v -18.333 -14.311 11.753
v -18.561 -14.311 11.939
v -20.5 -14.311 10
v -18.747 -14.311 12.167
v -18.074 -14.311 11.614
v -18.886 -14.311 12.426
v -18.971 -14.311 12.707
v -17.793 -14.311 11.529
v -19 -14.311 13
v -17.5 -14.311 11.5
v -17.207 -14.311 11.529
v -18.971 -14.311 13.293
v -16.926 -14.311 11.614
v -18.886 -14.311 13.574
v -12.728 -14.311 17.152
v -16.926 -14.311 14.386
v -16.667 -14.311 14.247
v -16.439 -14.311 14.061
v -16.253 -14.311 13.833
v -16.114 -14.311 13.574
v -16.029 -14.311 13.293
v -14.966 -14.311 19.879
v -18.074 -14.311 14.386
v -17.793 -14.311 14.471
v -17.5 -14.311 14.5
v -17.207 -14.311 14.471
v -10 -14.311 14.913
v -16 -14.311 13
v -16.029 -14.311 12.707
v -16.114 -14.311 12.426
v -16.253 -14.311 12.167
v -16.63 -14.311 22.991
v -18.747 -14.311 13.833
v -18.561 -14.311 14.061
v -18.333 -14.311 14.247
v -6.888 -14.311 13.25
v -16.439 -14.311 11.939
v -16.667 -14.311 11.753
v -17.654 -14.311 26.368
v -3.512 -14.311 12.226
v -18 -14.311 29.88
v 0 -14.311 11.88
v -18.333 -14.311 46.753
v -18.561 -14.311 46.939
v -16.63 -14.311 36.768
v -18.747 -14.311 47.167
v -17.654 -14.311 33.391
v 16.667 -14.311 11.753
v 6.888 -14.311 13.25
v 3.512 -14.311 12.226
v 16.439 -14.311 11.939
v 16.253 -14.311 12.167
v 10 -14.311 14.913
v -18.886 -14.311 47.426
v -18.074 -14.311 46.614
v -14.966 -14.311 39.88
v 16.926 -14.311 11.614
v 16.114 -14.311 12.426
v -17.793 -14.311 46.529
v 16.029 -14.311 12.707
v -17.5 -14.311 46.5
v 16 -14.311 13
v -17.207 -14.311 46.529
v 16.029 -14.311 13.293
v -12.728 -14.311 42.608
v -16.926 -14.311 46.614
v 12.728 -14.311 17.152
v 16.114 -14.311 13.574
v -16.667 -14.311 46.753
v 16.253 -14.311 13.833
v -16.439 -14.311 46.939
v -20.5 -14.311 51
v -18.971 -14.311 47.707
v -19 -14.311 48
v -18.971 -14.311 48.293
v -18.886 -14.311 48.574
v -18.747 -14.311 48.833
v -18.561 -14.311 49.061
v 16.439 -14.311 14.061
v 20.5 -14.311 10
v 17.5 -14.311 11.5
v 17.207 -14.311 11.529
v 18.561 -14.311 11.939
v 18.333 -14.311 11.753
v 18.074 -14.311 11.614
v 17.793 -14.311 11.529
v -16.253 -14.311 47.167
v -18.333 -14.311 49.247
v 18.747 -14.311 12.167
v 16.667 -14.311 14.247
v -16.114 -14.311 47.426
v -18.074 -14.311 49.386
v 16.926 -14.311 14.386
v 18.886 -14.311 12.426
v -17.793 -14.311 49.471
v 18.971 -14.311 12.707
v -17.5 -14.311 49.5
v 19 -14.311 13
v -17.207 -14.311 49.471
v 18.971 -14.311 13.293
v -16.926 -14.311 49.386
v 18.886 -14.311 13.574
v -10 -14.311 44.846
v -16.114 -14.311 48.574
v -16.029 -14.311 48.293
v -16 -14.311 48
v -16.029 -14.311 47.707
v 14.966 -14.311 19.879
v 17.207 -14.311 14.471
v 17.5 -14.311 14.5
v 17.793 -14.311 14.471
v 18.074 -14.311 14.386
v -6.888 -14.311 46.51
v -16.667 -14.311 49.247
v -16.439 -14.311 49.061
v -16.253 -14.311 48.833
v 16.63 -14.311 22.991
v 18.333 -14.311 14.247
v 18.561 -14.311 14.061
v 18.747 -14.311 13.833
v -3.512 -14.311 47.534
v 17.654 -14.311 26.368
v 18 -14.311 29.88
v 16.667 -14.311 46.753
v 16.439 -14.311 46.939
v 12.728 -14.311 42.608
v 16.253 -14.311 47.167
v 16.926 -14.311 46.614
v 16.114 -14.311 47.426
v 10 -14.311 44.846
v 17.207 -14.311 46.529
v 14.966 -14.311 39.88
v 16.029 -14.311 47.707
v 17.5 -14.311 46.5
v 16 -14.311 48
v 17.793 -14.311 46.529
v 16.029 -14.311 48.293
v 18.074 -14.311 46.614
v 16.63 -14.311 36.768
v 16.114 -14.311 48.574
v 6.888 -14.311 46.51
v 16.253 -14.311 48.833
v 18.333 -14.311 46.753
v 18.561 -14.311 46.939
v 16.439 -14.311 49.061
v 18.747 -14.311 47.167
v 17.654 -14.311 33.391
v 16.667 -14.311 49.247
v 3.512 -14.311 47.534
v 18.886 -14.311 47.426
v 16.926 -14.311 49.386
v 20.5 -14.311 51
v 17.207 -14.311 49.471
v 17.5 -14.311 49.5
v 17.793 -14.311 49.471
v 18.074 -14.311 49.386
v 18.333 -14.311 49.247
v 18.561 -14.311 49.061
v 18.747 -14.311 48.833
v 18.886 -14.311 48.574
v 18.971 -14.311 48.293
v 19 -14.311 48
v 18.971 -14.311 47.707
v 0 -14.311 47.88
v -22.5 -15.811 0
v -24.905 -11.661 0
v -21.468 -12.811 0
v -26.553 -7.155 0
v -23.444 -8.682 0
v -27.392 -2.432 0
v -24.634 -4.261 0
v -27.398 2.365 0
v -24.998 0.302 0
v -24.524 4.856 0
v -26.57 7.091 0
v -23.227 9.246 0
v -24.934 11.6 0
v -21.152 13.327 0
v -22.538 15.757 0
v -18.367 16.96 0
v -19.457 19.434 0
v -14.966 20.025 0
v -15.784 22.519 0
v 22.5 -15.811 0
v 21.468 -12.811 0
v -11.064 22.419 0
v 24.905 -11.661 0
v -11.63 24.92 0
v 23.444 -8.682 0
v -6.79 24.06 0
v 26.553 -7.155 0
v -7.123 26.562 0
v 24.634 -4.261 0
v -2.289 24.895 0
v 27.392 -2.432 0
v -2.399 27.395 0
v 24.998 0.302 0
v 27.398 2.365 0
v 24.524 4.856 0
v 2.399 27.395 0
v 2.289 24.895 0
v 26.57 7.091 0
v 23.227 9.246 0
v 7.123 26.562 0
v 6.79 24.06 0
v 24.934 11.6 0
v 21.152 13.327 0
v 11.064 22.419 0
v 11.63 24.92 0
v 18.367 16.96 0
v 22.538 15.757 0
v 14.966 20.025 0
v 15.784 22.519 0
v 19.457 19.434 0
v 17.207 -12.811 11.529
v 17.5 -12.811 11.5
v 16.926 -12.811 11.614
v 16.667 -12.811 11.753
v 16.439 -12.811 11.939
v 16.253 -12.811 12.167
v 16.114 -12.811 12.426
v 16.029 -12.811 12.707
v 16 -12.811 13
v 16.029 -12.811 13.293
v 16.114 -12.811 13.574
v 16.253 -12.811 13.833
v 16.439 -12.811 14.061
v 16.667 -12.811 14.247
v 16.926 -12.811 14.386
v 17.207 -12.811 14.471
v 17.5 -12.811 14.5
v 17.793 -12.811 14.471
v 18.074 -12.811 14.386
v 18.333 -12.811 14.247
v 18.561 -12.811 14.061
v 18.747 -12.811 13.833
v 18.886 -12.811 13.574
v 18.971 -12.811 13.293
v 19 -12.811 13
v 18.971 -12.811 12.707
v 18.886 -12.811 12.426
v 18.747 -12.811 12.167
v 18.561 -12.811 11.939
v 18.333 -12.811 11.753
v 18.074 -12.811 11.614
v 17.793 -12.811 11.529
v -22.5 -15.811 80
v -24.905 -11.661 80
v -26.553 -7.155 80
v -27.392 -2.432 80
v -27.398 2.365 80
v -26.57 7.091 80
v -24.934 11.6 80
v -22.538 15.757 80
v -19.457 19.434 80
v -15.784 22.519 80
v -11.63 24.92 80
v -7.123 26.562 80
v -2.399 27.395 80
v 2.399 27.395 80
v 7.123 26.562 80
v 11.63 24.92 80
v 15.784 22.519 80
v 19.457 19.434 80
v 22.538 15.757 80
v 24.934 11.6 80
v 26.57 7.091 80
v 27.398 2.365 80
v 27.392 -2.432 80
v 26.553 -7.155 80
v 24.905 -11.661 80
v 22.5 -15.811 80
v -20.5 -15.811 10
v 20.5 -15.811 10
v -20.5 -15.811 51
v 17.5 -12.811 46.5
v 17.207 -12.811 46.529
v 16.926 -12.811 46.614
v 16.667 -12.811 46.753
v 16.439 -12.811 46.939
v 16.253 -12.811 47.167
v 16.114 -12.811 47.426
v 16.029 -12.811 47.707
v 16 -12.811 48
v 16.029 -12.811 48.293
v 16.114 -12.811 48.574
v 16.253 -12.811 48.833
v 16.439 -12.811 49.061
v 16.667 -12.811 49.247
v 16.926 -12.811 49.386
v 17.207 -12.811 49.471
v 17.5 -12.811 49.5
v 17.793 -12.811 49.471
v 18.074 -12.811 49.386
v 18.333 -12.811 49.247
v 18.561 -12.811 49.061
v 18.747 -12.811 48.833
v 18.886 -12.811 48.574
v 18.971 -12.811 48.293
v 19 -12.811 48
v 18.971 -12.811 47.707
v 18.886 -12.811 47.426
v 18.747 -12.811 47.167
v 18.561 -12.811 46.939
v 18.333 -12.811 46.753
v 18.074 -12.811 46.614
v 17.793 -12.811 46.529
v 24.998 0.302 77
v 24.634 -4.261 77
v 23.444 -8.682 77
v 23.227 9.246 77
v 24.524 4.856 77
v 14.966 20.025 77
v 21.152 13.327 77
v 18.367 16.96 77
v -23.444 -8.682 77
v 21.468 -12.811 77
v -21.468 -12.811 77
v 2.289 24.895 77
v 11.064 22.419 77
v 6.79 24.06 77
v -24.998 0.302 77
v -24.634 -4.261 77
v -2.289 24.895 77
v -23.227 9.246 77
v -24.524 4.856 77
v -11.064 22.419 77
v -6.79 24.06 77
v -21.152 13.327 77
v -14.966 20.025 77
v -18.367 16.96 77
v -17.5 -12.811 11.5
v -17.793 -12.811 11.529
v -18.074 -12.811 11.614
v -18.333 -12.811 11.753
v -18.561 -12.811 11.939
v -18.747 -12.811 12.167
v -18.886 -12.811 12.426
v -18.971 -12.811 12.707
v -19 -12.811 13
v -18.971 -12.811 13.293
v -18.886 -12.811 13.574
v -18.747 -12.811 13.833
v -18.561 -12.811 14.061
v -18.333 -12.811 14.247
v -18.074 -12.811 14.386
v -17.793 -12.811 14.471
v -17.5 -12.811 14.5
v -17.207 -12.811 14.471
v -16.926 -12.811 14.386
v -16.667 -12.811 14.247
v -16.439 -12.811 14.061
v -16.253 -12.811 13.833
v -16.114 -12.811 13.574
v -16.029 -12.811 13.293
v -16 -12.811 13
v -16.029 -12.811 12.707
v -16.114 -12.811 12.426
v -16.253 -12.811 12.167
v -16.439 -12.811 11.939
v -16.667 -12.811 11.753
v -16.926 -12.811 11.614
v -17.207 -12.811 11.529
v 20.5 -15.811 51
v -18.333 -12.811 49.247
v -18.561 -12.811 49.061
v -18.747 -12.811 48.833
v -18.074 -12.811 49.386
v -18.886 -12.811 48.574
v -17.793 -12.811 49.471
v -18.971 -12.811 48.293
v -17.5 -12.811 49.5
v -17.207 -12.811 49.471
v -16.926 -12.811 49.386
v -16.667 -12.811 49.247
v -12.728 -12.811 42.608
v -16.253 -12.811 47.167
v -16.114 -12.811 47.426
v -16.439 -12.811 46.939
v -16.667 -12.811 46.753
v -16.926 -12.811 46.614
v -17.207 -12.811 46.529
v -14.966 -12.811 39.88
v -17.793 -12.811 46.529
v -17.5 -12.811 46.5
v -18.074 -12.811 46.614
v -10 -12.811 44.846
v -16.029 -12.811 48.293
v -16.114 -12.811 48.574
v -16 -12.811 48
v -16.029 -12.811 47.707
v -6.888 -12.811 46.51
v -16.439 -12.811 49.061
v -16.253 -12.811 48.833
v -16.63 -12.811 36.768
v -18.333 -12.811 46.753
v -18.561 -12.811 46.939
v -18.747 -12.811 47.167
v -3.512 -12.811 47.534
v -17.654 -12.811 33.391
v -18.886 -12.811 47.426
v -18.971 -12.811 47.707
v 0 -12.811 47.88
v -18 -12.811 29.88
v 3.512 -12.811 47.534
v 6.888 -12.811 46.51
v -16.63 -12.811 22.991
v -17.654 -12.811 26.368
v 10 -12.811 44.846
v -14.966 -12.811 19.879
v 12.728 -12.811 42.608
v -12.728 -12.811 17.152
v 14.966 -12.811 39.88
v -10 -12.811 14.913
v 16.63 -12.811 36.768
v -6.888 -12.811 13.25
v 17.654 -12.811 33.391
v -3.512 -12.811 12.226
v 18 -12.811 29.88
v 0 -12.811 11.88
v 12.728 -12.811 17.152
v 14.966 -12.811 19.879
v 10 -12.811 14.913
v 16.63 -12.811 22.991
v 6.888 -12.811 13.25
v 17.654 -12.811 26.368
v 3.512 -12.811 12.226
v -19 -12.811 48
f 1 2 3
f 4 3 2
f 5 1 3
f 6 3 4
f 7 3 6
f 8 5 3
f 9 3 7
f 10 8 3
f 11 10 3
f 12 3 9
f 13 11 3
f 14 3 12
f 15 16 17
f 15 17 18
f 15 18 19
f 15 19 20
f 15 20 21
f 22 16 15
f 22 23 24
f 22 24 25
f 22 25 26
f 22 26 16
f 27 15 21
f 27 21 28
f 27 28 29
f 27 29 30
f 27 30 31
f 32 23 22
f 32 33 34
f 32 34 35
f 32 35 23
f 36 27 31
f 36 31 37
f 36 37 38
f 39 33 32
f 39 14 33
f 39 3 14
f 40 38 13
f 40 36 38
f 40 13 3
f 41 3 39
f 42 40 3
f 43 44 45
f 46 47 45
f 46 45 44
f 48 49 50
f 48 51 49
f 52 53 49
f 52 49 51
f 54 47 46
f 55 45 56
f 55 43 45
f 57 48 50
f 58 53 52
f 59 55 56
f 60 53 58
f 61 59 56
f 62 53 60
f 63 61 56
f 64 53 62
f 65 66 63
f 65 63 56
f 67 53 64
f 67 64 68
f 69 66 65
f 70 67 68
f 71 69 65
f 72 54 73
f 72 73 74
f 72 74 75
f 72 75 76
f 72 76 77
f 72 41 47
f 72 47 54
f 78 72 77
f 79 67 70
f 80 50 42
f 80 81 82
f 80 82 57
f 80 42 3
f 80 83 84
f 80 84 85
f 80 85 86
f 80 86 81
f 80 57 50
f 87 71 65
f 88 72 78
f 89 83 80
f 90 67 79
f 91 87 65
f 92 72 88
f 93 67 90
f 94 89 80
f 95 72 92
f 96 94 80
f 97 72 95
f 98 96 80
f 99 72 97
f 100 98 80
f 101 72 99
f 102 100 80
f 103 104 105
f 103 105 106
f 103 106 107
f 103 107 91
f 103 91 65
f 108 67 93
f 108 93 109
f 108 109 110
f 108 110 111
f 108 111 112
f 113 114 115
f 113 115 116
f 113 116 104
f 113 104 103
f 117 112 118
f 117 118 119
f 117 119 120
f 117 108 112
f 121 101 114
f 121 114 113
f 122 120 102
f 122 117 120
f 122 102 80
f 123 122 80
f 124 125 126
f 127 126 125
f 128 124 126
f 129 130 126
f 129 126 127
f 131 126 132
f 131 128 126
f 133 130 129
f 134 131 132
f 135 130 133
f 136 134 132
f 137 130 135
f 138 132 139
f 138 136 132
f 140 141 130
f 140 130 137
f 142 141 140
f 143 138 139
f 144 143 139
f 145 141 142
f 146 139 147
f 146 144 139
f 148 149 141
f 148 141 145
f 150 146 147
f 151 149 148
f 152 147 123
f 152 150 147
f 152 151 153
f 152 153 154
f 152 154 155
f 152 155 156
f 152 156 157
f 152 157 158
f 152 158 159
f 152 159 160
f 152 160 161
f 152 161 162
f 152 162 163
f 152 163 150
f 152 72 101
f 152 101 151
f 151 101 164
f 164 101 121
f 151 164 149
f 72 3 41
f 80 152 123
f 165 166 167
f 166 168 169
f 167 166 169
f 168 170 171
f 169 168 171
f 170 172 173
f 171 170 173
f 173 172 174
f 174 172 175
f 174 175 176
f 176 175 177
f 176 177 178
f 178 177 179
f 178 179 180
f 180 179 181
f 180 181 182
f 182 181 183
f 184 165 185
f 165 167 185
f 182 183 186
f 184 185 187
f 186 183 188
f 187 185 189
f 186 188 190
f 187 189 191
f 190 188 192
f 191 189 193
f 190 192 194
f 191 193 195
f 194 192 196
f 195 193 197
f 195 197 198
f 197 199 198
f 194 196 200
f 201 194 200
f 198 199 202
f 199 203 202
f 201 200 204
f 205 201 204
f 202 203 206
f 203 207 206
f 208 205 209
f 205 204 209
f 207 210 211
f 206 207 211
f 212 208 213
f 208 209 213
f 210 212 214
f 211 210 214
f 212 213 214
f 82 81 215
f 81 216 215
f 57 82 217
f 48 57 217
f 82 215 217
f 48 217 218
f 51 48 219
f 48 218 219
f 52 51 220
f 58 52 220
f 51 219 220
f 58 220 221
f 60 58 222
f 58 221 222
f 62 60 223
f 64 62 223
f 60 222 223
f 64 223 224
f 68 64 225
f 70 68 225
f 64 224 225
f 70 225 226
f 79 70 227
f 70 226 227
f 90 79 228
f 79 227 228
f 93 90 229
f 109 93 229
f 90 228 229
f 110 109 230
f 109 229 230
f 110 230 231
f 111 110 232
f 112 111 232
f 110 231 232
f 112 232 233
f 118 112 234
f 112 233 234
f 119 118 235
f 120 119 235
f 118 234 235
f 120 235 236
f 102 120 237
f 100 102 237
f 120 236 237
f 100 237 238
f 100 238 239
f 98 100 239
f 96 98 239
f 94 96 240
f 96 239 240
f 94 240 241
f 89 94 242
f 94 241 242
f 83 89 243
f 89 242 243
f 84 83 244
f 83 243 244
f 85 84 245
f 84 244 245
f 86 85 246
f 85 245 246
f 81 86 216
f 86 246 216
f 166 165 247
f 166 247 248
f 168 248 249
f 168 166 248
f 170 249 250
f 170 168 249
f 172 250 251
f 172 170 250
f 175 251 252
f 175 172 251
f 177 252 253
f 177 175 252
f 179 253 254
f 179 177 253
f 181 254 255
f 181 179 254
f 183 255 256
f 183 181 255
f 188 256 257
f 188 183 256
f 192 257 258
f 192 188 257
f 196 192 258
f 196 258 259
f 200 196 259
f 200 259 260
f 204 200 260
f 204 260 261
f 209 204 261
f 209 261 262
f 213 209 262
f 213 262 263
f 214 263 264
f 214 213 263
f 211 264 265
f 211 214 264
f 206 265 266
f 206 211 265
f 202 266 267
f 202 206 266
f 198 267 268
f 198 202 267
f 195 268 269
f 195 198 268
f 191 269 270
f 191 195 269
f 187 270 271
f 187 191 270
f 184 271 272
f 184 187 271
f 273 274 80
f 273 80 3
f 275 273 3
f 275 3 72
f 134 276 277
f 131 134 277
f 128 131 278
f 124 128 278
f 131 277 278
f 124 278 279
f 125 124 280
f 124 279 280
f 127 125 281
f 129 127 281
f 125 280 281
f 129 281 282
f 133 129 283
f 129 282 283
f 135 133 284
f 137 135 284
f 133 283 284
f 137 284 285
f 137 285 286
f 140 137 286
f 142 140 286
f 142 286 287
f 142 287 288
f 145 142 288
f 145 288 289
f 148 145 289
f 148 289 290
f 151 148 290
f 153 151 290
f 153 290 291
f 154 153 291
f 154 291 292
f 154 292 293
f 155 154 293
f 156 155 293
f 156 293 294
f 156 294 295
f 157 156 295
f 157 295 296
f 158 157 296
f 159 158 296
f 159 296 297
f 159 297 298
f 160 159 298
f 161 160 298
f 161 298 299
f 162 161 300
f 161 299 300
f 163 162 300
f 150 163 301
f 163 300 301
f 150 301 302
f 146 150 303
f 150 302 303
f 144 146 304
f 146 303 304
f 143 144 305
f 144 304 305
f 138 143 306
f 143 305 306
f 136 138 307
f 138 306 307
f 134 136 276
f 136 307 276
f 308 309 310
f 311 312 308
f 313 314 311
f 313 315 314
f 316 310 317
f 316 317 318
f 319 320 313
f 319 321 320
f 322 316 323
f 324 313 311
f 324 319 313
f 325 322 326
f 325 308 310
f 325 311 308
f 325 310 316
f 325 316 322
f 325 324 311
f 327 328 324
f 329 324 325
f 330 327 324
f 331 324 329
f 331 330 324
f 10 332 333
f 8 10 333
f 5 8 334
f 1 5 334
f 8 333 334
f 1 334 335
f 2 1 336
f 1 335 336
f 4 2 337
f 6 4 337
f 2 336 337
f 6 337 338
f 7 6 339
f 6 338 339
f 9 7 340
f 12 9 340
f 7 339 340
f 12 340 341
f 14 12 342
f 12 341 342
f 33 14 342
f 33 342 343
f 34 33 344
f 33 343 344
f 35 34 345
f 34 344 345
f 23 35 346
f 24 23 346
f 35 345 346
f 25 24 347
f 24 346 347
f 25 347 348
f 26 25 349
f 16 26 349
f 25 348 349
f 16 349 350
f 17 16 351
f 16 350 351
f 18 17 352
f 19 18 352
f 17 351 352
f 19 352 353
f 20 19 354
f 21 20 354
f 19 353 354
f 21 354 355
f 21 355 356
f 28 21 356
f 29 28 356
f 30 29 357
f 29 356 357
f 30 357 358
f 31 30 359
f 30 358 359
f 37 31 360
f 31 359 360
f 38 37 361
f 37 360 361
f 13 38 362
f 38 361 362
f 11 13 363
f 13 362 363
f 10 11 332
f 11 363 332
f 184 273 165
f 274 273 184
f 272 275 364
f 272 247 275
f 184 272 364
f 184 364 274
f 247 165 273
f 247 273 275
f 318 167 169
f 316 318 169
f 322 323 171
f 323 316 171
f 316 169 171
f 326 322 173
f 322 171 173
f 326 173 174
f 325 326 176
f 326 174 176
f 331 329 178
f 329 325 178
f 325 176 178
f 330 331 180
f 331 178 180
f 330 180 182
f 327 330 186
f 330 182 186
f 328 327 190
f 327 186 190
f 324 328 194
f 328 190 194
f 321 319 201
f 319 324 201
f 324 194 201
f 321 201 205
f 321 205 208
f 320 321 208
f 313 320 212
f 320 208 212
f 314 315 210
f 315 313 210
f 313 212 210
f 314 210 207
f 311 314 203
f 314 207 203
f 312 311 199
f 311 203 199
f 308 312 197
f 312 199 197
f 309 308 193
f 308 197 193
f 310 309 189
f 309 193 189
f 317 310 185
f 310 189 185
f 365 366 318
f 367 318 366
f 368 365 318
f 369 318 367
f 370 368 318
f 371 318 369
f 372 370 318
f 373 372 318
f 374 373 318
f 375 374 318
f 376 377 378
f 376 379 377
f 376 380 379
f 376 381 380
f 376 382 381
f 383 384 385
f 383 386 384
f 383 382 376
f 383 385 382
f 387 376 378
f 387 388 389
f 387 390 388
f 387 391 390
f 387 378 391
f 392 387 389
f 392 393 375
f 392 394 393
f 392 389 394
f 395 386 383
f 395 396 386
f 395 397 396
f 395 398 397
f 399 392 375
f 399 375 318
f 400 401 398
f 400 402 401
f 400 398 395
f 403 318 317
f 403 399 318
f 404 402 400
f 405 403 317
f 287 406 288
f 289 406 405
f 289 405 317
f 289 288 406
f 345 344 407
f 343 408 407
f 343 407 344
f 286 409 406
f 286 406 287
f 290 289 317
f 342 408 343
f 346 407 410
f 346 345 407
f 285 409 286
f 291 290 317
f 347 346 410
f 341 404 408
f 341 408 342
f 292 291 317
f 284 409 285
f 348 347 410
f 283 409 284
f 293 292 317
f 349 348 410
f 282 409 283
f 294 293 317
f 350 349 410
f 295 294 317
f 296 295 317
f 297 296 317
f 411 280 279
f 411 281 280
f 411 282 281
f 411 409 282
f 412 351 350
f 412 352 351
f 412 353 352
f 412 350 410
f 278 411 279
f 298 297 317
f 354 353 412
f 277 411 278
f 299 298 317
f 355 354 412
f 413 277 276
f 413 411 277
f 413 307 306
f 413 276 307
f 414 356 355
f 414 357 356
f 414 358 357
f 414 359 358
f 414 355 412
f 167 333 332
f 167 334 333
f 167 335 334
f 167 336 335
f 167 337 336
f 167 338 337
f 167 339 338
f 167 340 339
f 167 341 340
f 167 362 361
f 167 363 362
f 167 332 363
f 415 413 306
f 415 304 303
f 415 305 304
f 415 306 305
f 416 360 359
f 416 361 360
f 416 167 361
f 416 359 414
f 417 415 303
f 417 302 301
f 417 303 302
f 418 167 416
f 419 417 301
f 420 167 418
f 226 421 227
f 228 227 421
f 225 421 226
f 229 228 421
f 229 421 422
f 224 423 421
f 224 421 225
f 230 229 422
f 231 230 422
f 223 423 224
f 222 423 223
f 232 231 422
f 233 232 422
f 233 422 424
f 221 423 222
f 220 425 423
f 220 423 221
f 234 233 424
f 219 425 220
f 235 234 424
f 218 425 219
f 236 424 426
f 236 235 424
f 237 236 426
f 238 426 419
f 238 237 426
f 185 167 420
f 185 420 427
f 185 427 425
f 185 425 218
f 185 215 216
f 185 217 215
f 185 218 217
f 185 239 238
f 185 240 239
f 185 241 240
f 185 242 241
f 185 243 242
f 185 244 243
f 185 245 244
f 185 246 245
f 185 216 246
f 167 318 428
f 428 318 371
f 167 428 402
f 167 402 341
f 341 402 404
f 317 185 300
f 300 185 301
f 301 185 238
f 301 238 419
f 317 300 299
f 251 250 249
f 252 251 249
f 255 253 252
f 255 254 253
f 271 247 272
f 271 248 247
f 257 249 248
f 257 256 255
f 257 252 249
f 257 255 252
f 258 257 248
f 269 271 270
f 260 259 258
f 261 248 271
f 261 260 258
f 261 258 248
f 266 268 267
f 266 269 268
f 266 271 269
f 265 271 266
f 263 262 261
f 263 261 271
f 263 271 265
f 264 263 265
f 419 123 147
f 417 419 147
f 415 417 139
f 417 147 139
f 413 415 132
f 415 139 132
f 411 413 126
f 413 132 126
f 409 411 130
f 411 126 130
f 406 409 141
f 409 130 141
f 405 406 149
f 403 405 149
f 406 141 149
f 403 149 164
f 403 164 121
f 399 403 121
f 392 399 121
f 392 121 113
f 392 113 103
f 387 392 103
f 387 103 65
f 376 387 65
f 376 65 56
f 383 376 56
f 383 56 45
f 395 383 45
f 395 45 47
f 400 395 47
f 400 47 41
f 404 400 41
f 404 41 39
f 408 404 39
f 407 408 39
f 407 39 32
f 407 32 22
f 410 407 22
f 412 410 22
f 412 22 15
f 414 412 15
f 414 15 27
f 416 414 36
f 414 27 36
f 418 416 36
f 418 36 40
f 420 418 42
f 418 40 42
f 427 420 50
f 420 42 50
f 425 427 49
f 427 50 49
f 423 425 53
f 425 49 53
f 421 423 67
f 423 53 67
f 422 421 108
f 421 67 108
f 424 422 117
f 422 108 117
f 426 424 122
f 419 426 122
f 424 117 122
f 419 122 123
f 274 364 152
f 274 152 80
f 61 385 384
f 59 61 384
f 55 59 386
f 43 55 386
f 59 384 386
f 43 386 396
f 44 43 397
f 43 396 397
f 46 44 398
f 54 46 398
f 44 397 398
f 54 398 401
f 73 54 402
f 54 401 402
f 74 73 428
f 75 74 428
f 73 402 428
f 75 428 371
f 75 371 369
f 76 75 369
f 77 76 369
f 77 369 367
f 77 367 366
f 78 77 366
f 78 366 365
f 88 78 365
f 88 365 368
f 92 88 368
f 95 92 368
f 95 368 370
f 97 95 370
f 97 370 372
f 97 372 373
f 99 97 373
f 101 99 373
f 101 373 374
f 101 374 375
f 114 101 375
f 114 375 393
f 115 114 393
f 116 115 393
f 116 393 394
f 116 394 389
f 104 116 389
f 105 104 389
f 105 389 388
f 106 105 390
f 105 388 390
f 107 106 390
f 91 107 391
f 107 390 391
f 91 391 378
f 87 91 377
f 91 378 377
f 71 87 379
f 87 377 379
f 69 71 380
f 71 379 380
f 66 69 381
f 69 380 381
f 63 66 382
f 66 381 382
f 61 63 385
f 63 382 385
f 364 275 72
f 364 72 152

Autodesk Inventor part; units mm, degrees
ref_plane "YZ Plane" through (0, 0, 0) normal (1, 0, 0) x (0, 1, 0)
ref_plane "XZ Plane" through (0, 0, 0) normal (0, 1, 0) x (-1, 0, 0)
ref_plane "XY Plane" through (0, 0, 0) normal (0, 0, 1) x (1, 0, 0)
sketch "Sketch1" plane through (0, 0, 0) normal (0, 0, 1) x (1, 0, 0)
  circle A0 centre (0, 0) radius 27.5
  dimension "d0" = 55
extrude "Extrusion1" add sketch "Sketch1" along normal blind 80
sketch "Sketch2" plane through (0, 0, 80) normal (0, 0, 1) x (1, 0, 0)
  circle A0 centre (0, 0) radius 27.5 projected
  line L0 (-22.5, -15.8114) -> (22.5, -15.8114)
  dimension "d5" = 45
extrude "Extrusion2" cut sketch "Sketch2" against normal blind 80 contours L0 A0 picked at (-6.0353, -17.4405)
sketch "Sketch3" plane through (-22.5, -15.8114, 80) normal (0, -1, 0) x (1, 0, 0)
  line L0 (43, -70) -> (2, -70)
  line L1 (2, -70) -> (2, -29)
  line L2 (2, -29) -> (43, -29)
  line L3 (43, -29) -> (43, -70)
  line L4 (0, -80) -> (0, 0) projected
  line L5 (45, 0) -> (45, -80) projected
  line L6 (0, 0) -> (45, 0) projected
  line L7 (45, -80) -> (0, -80) projected
  point P0 (22.5, -80)
  dimension "d16" = 41
  dimension "d17" = 41
  dimension "d18" = 45
  dimension "d19" = 2
  dimension "d20" = 29
extrude "Extrusion3" cut sketch "Sketch3" against normal blind 1.5 contours L0 L1 L2 L3
sketch "Sketch4" plane through (0, 0, 0) normal (0, 0, -1) x (-1, 0, 0)
  arc A0 (22.5, -15.8114) -> (-22.5, -15.8114) centre (0, 0) ccw projected
  circle A1 centre (0, 0) radius 25
  line L0 (21.4678, -12.8114) -> (-21.4678, -12.8114)
  line L1 (-22.5, -15.8114) -> (22.5, -15.8114) projected
  dimension "d12" = 50
  dimension "d13" = 3
extrude "Extrusion4" cut sketch "Sketch4" against normal blind 77 contours L0 A1
sketch "Sketch5" plane through (-22.5, -14.3114, 80) normal (0, -1, 0) x (1, 0, 0)
  circle A0 centre (22.5, -50.1203) radius 18
  point P0 (22.5, -80)
  dimension "d25" = 36
extrude "Extrusion5" cut sketch "Sketch5" against normal blind 31
hole "Hole1" at (-17.5, -14.3114, 48) direction (0, 1, 0) diameter 3 depth 8
hole "Hole2" at (17.5, -14.3114, 48) direction (0, 1, 0) diameter 3 depth 8
hole "Hole3" at (-17.5, -14.3114, 13) direction (0, 1, 0) diameter 3 depth 8
hole "Hole4" at (17.5, -14.3114, 13) direction (0, 1, 0) diameter 3 depth 8
properties part number "speaker_body"
